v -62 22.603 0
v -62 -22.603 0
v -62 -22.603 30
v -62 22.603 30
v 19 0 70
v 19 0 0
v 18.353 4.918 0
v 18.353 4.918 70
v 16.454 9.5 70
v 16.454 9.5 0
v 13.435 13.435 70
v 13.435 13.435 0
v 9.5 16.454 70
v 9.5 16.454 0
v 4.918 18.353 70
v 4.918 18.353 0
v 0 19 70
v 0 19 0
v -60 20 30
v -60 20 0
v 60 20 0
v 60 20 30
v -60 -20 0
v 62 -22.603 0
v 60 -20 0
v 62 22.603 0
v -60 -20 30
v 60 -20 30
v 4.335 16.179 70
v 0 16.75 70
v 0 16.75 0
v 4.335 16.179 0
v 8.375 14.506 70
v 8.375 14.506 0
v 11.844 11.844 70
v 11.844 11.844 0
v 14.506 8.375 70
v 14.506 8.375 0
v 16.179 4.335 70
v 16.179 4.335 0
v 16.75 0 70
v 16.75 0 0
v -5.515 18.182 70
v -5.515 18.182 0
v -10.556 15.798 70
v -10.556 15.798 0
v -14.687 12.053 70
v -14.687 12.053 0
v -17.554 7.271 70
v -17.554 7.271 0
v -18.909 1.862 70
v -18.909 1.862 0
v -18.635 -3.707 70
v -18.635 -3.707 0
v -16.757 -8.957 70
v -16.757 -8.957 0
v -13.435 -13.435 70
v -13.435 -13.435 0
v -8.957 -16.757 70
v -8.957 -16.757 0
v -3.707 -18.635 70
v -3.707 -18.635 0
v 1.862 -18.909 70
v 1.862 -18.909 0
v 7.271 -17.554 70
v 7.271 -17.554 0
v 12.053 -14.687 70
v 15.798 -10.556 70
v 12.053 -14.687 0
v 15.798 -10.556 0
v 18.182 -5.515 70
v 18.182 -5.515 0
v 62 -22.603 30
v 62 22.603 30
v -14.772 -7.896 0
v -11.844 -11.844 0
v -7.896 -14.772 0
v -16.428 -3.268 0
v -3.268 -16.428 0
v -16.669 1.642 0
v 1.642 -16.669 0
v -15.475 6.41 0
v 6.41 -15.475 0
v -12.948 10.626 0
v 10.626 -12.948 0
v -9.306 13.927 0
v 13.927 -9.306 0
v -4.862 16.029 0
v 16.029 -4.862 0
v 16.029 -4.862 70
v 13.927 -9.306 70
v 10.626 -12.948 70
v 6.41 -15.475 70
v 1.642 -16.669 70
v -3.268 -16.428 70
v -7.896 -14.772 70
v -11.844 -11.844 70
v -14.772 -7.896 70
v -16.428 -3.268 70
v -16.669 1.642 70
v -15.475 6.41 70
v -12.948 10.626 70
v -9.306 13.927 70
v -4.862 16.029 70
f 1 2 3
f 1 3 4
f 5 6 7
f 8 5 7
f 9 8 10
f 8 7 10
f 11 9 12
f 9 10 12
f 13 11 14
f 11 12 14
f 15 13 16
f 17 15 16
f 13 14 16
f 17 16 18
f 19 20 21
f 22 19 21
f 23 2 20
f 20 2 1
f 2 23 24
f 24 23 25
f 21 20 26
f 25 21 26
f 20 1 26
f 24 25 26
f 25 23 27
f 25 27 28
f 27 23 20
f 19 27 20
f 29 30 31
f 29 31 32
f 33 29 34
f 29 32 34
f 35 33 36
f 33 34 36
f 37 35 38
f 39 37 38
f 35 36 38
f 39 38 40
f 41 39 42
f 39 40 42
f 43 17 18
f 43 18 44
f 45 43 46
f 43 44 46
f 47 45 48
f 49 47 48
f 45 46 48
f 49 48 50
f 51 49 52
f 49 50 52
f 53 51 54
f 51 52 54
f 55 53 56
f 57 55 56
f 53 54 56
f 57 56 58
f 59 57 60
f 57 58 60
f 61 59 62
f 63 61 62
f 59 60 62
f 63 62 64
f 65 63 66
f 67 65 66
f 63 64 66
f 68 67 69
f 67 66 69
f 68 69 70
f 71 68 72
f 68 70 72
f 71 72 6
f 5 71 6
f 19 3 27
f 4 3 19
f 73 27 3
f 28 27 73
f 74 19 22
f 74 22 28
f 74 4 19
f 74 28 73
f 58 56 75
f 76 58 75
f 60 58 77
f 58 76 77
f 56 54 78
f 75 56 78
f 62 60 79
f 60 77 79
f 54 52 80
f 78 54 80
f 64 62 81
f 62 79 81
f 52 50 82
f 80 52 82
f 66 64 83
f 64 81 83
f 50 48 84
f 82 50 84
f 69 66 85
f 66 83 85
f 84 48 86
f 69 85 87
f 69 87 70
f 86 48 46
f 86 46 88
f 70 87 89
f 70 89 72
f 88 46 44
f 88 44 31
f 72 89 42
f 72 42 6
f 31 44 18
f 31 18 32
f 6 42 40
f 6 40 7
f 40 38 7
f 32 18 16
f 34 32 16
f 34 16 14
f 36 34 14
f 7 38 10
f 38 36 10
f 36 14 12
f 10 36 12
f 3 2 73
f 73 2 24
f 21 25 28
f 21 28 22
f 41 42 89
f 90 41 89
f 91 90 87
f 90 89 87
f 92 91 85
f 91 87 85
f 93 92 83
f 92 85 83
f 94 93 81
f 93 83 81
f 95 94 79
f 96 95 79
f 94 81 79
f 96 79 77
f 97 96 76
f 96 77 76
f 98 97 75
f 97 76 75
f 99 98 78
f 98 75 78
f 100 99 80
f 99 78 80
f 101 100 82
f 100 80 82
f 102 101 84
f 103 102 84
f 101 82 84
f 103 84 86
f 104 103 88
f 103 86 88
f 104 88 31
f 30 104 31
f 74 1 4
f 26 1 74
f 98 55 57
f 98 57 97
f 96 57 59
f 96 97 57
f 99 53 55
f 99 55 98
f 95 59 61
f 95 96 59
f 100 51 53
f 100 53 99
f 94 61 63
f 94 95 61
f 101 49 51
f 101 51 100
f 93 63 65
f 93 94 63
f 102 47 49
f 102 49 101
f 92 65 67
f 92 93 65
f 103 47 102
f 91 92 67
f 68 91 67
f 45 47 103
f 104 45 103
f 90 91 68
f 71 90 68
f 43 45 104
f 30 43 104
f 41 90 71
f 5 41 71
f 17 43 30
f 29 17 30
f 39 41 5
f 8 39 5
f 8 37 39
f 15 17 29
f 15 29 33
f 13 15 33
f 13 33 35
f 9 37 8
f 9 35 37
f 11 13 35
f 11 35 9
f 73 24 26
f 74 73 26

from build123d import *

# Parameters (mm, degrees)
F1_DEPTH = 70
F2_W     = 124
F2_H     = 45.206268
F2_W_2   = 120
F2_H_2   = 40
F3_DEPTH = 30


with BuildPart() as f1:
    # F0 (on Top) → F1 (new body)
    with BuildSketch(Plane.XY):
        with BuildLine():
            ThreePointArc((19, 0), (13.435029, 13.435029), (0, 19))
            ThreePointArc((0, 19), (-13.435029, -13.435029), (19, 0))
        make_face()
        with BuildLine():
            ThreePointArc((0, 16.75), (11.844039, 11.844039), (16.75, 0))
            ThreePointArc((16.75, 0), (-11.844039, -11.844039), (0, 16.75))
        make_face(mode=Mode.SUBTRACT)
    extrude(amount=F1_DEPTH)


with BuildPart() as f3:
    # F2 (on Top) → F3 (new body)
    with BuildSketch(Plane.XY):
        Rectangle(F2_W, F2_H)
        Rectangle(F2_W_2, F2_H_2, mode=Mode.SUBTRACT)
    extrude(amount=F3_DEPTH)


solid = Compound([f1.part, f3.part])
